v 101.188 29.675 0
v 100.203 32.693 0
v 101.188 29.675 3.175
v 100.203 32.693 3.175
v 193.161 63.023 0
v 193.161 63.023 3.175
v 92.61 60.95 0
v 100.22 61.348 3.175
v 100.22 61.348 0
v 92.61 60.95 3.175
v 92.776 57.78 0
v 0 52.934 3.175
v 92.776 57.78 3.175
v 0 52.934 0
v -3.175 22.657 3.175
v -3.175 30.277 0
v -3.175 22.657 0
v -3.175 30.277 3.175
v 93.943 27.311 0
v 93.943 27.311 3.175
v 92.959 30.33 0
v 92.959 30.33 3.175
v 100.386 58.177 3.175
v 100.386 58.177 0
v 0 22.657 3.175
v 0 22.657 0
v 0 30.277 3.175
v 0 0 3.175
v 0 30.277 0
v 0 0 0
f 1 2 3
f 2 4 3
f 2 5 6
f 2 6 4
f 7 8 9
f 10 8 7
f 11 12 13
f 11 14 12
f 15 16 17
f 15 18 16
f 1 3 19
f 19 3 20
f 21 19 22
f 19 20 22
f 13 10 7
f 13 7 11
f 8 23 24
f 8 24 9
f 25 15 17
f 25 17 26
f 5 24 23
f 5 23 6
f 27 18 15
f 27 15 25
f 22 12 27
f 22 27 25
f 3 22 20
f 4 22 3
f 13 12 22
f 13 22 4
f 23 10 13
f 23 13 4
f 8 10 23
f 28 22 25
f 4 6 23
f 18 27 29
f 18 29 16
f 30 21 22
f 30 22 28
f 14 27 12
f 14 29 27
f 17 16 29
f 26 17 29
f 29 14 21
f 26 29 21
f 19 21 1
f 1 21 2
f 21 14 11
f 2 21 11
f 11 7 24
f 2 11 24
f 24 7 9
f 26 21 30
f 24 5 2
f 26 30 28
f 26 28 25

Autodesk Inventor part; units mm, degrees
ref_plane "YZ Plane" through (0, 0, 0) normal (1, 0, 0) x (0, 1, 0)
ref_plane "XZ Plane" through (0, 0, 0) normal (0, 1, 0) x (-1, 0, 0)
ref_plane "XY Plane" through (0, 0, 0) normal (0, 0, 1) x (1, 0, 0)
sketch "Sketch1" plane through (0, 0, 0) normal (0, 0, 1) x (1, 0, 0)
  line L0 (0, 0) -> (0, 52.9336)
  line L1 (0, 52.9336) -> (193.1614, 63.023)
  line L2 (193.1614, 63.023) -> (0, 0)
  dimension "d0" = 52.9336
  dimension "d34" = 15.08
  dimension "d48" = 92.99
extrude "Extrusion1" add sketch "Sketch1" along normal blind 3.175
sketch "Sketch5" plane through (0, 0, 3.175) normal (0, 0, 1) x (1, 0, 0)
  line L0 (0, 52.9336) -> (0, 0) projected
  line L1 (193.1614, 63.023) -> (0, 52.9336) projected
  line L2 (0, 30.2768) -> (-3.175, 30.2768)
  line L3 (-3.175, 30.2768) -> (-3.175, 22.6568)
  line L4 (-3.175, 22.6568) -> (0, 22.6568)
  line L5 (0, 22.6568) -> (0, 30.2768)
  line L6 (100.3855, 58.177) -> (100.2199, 61.3477)
  line L7 (100.2199, 61.3477) -> (92.6103, 60.9502)
  line L8 (92.6103, 60.9502) -> (92.7759, 57.7795)
  line L9 (92.7759, 57.7795) -> (100.3855, 58.177)
  line L10 (0, 0) -> (193.1614, 63.023) projected
  line L11 (100.2028, 32.6933) -> (101.1876, 29.6749)
  line L12 (101.1876, 29.6749) -> (93.9434, 27.3113)
  line L13 (93.9434, 27.3113) -> (92.9586, 30.3297)
  line L14 (92.9586, 30.3297) -> (100.2028, 32.6933)
  point P0 (0, 26.4668)
  point P1 (96.5807, 57.9783)
  point P2 (96.5807, 31.5115)
  dimension "d36" = 7.62
  dimension "d37" = 3.81
  dimension "d38" = 3.175
  dimension "d39" = 3.81
  dimension "d40" = 7.62
  dimension "d41" = 3.175
  dimension "d42" = 3.81
  dimension "d44" = 7.62
  dimension "d45" = 3.175
extrude "Extrusion5" add sketch "Sketch5" against normal blind 3.175 contours L0 L4 L3 L2 | L8 L7 L6 L1 | L10 L11 L12 L13
sketch "Sketch6" plane through (0, 0, 3.175) normal (0, 0, 1) x (1, 0, 0)
  line L0 (0, 0) -> (0, 22.6568)
  line L1 (0, 22.6568) -> (-3.175, 22.6568)
  line L2 (-3.175, 22.6568) -> (-3.175, 30.2768)
  line L3 (-3.175, 22.6568) -> (-3.175, 30.2768) projected
  line L4 (-3.175, 30.2768) -> (0, 30.2768)
  line L5 (0, 30.2768) -> (0, 52.9336)
  line L6 (0, 30.2768) -> (0, 52.9336) projected
  line L7 (0, 52.9336) -> (92.7759, 57.7795)
  line L8 (92.7759, 57.7795) -> (0, 52.9336) projected
  line L9 (92.7759, 57.7795) -> (92.6103, 60.9502)
  line L10 (92.6103, 60.9502) -> (100.2199, 61.3477)
  line L11 (92.6103, 60.9502) -> (100.2199, 61.3477) projected
  line L12 (100.2199, 61.3477) -> (100.3855, 58.177)
  line L13 (100.3855, 58.177) -> (193.1614, 63.023)
  line L14 (100.3855, 58.177) -> (193.1614, 63.023) projected
  line L15 (193.1614, 63.023) -> (100.2028, 32.6933)
  line L16 (101.1876, 29.6749) -> (93.9434, 27.3113) projected
  line L17 (100.2028, 32.6933) -> (101.1876, 29.6749)
  line L18 (101.1876, 29.6749) -> (93.9434, 27.3113)
  line L19 (93.9434, 27.3113) -> (92.9586, 30.3297)
  line L20 (92.9586, 30.3297) -> (0, 0)
  line L21 (92.9586, 30.3297) -> (0, 0) projected
properties part number "Star Side Out" material "Wood (Birch)"
